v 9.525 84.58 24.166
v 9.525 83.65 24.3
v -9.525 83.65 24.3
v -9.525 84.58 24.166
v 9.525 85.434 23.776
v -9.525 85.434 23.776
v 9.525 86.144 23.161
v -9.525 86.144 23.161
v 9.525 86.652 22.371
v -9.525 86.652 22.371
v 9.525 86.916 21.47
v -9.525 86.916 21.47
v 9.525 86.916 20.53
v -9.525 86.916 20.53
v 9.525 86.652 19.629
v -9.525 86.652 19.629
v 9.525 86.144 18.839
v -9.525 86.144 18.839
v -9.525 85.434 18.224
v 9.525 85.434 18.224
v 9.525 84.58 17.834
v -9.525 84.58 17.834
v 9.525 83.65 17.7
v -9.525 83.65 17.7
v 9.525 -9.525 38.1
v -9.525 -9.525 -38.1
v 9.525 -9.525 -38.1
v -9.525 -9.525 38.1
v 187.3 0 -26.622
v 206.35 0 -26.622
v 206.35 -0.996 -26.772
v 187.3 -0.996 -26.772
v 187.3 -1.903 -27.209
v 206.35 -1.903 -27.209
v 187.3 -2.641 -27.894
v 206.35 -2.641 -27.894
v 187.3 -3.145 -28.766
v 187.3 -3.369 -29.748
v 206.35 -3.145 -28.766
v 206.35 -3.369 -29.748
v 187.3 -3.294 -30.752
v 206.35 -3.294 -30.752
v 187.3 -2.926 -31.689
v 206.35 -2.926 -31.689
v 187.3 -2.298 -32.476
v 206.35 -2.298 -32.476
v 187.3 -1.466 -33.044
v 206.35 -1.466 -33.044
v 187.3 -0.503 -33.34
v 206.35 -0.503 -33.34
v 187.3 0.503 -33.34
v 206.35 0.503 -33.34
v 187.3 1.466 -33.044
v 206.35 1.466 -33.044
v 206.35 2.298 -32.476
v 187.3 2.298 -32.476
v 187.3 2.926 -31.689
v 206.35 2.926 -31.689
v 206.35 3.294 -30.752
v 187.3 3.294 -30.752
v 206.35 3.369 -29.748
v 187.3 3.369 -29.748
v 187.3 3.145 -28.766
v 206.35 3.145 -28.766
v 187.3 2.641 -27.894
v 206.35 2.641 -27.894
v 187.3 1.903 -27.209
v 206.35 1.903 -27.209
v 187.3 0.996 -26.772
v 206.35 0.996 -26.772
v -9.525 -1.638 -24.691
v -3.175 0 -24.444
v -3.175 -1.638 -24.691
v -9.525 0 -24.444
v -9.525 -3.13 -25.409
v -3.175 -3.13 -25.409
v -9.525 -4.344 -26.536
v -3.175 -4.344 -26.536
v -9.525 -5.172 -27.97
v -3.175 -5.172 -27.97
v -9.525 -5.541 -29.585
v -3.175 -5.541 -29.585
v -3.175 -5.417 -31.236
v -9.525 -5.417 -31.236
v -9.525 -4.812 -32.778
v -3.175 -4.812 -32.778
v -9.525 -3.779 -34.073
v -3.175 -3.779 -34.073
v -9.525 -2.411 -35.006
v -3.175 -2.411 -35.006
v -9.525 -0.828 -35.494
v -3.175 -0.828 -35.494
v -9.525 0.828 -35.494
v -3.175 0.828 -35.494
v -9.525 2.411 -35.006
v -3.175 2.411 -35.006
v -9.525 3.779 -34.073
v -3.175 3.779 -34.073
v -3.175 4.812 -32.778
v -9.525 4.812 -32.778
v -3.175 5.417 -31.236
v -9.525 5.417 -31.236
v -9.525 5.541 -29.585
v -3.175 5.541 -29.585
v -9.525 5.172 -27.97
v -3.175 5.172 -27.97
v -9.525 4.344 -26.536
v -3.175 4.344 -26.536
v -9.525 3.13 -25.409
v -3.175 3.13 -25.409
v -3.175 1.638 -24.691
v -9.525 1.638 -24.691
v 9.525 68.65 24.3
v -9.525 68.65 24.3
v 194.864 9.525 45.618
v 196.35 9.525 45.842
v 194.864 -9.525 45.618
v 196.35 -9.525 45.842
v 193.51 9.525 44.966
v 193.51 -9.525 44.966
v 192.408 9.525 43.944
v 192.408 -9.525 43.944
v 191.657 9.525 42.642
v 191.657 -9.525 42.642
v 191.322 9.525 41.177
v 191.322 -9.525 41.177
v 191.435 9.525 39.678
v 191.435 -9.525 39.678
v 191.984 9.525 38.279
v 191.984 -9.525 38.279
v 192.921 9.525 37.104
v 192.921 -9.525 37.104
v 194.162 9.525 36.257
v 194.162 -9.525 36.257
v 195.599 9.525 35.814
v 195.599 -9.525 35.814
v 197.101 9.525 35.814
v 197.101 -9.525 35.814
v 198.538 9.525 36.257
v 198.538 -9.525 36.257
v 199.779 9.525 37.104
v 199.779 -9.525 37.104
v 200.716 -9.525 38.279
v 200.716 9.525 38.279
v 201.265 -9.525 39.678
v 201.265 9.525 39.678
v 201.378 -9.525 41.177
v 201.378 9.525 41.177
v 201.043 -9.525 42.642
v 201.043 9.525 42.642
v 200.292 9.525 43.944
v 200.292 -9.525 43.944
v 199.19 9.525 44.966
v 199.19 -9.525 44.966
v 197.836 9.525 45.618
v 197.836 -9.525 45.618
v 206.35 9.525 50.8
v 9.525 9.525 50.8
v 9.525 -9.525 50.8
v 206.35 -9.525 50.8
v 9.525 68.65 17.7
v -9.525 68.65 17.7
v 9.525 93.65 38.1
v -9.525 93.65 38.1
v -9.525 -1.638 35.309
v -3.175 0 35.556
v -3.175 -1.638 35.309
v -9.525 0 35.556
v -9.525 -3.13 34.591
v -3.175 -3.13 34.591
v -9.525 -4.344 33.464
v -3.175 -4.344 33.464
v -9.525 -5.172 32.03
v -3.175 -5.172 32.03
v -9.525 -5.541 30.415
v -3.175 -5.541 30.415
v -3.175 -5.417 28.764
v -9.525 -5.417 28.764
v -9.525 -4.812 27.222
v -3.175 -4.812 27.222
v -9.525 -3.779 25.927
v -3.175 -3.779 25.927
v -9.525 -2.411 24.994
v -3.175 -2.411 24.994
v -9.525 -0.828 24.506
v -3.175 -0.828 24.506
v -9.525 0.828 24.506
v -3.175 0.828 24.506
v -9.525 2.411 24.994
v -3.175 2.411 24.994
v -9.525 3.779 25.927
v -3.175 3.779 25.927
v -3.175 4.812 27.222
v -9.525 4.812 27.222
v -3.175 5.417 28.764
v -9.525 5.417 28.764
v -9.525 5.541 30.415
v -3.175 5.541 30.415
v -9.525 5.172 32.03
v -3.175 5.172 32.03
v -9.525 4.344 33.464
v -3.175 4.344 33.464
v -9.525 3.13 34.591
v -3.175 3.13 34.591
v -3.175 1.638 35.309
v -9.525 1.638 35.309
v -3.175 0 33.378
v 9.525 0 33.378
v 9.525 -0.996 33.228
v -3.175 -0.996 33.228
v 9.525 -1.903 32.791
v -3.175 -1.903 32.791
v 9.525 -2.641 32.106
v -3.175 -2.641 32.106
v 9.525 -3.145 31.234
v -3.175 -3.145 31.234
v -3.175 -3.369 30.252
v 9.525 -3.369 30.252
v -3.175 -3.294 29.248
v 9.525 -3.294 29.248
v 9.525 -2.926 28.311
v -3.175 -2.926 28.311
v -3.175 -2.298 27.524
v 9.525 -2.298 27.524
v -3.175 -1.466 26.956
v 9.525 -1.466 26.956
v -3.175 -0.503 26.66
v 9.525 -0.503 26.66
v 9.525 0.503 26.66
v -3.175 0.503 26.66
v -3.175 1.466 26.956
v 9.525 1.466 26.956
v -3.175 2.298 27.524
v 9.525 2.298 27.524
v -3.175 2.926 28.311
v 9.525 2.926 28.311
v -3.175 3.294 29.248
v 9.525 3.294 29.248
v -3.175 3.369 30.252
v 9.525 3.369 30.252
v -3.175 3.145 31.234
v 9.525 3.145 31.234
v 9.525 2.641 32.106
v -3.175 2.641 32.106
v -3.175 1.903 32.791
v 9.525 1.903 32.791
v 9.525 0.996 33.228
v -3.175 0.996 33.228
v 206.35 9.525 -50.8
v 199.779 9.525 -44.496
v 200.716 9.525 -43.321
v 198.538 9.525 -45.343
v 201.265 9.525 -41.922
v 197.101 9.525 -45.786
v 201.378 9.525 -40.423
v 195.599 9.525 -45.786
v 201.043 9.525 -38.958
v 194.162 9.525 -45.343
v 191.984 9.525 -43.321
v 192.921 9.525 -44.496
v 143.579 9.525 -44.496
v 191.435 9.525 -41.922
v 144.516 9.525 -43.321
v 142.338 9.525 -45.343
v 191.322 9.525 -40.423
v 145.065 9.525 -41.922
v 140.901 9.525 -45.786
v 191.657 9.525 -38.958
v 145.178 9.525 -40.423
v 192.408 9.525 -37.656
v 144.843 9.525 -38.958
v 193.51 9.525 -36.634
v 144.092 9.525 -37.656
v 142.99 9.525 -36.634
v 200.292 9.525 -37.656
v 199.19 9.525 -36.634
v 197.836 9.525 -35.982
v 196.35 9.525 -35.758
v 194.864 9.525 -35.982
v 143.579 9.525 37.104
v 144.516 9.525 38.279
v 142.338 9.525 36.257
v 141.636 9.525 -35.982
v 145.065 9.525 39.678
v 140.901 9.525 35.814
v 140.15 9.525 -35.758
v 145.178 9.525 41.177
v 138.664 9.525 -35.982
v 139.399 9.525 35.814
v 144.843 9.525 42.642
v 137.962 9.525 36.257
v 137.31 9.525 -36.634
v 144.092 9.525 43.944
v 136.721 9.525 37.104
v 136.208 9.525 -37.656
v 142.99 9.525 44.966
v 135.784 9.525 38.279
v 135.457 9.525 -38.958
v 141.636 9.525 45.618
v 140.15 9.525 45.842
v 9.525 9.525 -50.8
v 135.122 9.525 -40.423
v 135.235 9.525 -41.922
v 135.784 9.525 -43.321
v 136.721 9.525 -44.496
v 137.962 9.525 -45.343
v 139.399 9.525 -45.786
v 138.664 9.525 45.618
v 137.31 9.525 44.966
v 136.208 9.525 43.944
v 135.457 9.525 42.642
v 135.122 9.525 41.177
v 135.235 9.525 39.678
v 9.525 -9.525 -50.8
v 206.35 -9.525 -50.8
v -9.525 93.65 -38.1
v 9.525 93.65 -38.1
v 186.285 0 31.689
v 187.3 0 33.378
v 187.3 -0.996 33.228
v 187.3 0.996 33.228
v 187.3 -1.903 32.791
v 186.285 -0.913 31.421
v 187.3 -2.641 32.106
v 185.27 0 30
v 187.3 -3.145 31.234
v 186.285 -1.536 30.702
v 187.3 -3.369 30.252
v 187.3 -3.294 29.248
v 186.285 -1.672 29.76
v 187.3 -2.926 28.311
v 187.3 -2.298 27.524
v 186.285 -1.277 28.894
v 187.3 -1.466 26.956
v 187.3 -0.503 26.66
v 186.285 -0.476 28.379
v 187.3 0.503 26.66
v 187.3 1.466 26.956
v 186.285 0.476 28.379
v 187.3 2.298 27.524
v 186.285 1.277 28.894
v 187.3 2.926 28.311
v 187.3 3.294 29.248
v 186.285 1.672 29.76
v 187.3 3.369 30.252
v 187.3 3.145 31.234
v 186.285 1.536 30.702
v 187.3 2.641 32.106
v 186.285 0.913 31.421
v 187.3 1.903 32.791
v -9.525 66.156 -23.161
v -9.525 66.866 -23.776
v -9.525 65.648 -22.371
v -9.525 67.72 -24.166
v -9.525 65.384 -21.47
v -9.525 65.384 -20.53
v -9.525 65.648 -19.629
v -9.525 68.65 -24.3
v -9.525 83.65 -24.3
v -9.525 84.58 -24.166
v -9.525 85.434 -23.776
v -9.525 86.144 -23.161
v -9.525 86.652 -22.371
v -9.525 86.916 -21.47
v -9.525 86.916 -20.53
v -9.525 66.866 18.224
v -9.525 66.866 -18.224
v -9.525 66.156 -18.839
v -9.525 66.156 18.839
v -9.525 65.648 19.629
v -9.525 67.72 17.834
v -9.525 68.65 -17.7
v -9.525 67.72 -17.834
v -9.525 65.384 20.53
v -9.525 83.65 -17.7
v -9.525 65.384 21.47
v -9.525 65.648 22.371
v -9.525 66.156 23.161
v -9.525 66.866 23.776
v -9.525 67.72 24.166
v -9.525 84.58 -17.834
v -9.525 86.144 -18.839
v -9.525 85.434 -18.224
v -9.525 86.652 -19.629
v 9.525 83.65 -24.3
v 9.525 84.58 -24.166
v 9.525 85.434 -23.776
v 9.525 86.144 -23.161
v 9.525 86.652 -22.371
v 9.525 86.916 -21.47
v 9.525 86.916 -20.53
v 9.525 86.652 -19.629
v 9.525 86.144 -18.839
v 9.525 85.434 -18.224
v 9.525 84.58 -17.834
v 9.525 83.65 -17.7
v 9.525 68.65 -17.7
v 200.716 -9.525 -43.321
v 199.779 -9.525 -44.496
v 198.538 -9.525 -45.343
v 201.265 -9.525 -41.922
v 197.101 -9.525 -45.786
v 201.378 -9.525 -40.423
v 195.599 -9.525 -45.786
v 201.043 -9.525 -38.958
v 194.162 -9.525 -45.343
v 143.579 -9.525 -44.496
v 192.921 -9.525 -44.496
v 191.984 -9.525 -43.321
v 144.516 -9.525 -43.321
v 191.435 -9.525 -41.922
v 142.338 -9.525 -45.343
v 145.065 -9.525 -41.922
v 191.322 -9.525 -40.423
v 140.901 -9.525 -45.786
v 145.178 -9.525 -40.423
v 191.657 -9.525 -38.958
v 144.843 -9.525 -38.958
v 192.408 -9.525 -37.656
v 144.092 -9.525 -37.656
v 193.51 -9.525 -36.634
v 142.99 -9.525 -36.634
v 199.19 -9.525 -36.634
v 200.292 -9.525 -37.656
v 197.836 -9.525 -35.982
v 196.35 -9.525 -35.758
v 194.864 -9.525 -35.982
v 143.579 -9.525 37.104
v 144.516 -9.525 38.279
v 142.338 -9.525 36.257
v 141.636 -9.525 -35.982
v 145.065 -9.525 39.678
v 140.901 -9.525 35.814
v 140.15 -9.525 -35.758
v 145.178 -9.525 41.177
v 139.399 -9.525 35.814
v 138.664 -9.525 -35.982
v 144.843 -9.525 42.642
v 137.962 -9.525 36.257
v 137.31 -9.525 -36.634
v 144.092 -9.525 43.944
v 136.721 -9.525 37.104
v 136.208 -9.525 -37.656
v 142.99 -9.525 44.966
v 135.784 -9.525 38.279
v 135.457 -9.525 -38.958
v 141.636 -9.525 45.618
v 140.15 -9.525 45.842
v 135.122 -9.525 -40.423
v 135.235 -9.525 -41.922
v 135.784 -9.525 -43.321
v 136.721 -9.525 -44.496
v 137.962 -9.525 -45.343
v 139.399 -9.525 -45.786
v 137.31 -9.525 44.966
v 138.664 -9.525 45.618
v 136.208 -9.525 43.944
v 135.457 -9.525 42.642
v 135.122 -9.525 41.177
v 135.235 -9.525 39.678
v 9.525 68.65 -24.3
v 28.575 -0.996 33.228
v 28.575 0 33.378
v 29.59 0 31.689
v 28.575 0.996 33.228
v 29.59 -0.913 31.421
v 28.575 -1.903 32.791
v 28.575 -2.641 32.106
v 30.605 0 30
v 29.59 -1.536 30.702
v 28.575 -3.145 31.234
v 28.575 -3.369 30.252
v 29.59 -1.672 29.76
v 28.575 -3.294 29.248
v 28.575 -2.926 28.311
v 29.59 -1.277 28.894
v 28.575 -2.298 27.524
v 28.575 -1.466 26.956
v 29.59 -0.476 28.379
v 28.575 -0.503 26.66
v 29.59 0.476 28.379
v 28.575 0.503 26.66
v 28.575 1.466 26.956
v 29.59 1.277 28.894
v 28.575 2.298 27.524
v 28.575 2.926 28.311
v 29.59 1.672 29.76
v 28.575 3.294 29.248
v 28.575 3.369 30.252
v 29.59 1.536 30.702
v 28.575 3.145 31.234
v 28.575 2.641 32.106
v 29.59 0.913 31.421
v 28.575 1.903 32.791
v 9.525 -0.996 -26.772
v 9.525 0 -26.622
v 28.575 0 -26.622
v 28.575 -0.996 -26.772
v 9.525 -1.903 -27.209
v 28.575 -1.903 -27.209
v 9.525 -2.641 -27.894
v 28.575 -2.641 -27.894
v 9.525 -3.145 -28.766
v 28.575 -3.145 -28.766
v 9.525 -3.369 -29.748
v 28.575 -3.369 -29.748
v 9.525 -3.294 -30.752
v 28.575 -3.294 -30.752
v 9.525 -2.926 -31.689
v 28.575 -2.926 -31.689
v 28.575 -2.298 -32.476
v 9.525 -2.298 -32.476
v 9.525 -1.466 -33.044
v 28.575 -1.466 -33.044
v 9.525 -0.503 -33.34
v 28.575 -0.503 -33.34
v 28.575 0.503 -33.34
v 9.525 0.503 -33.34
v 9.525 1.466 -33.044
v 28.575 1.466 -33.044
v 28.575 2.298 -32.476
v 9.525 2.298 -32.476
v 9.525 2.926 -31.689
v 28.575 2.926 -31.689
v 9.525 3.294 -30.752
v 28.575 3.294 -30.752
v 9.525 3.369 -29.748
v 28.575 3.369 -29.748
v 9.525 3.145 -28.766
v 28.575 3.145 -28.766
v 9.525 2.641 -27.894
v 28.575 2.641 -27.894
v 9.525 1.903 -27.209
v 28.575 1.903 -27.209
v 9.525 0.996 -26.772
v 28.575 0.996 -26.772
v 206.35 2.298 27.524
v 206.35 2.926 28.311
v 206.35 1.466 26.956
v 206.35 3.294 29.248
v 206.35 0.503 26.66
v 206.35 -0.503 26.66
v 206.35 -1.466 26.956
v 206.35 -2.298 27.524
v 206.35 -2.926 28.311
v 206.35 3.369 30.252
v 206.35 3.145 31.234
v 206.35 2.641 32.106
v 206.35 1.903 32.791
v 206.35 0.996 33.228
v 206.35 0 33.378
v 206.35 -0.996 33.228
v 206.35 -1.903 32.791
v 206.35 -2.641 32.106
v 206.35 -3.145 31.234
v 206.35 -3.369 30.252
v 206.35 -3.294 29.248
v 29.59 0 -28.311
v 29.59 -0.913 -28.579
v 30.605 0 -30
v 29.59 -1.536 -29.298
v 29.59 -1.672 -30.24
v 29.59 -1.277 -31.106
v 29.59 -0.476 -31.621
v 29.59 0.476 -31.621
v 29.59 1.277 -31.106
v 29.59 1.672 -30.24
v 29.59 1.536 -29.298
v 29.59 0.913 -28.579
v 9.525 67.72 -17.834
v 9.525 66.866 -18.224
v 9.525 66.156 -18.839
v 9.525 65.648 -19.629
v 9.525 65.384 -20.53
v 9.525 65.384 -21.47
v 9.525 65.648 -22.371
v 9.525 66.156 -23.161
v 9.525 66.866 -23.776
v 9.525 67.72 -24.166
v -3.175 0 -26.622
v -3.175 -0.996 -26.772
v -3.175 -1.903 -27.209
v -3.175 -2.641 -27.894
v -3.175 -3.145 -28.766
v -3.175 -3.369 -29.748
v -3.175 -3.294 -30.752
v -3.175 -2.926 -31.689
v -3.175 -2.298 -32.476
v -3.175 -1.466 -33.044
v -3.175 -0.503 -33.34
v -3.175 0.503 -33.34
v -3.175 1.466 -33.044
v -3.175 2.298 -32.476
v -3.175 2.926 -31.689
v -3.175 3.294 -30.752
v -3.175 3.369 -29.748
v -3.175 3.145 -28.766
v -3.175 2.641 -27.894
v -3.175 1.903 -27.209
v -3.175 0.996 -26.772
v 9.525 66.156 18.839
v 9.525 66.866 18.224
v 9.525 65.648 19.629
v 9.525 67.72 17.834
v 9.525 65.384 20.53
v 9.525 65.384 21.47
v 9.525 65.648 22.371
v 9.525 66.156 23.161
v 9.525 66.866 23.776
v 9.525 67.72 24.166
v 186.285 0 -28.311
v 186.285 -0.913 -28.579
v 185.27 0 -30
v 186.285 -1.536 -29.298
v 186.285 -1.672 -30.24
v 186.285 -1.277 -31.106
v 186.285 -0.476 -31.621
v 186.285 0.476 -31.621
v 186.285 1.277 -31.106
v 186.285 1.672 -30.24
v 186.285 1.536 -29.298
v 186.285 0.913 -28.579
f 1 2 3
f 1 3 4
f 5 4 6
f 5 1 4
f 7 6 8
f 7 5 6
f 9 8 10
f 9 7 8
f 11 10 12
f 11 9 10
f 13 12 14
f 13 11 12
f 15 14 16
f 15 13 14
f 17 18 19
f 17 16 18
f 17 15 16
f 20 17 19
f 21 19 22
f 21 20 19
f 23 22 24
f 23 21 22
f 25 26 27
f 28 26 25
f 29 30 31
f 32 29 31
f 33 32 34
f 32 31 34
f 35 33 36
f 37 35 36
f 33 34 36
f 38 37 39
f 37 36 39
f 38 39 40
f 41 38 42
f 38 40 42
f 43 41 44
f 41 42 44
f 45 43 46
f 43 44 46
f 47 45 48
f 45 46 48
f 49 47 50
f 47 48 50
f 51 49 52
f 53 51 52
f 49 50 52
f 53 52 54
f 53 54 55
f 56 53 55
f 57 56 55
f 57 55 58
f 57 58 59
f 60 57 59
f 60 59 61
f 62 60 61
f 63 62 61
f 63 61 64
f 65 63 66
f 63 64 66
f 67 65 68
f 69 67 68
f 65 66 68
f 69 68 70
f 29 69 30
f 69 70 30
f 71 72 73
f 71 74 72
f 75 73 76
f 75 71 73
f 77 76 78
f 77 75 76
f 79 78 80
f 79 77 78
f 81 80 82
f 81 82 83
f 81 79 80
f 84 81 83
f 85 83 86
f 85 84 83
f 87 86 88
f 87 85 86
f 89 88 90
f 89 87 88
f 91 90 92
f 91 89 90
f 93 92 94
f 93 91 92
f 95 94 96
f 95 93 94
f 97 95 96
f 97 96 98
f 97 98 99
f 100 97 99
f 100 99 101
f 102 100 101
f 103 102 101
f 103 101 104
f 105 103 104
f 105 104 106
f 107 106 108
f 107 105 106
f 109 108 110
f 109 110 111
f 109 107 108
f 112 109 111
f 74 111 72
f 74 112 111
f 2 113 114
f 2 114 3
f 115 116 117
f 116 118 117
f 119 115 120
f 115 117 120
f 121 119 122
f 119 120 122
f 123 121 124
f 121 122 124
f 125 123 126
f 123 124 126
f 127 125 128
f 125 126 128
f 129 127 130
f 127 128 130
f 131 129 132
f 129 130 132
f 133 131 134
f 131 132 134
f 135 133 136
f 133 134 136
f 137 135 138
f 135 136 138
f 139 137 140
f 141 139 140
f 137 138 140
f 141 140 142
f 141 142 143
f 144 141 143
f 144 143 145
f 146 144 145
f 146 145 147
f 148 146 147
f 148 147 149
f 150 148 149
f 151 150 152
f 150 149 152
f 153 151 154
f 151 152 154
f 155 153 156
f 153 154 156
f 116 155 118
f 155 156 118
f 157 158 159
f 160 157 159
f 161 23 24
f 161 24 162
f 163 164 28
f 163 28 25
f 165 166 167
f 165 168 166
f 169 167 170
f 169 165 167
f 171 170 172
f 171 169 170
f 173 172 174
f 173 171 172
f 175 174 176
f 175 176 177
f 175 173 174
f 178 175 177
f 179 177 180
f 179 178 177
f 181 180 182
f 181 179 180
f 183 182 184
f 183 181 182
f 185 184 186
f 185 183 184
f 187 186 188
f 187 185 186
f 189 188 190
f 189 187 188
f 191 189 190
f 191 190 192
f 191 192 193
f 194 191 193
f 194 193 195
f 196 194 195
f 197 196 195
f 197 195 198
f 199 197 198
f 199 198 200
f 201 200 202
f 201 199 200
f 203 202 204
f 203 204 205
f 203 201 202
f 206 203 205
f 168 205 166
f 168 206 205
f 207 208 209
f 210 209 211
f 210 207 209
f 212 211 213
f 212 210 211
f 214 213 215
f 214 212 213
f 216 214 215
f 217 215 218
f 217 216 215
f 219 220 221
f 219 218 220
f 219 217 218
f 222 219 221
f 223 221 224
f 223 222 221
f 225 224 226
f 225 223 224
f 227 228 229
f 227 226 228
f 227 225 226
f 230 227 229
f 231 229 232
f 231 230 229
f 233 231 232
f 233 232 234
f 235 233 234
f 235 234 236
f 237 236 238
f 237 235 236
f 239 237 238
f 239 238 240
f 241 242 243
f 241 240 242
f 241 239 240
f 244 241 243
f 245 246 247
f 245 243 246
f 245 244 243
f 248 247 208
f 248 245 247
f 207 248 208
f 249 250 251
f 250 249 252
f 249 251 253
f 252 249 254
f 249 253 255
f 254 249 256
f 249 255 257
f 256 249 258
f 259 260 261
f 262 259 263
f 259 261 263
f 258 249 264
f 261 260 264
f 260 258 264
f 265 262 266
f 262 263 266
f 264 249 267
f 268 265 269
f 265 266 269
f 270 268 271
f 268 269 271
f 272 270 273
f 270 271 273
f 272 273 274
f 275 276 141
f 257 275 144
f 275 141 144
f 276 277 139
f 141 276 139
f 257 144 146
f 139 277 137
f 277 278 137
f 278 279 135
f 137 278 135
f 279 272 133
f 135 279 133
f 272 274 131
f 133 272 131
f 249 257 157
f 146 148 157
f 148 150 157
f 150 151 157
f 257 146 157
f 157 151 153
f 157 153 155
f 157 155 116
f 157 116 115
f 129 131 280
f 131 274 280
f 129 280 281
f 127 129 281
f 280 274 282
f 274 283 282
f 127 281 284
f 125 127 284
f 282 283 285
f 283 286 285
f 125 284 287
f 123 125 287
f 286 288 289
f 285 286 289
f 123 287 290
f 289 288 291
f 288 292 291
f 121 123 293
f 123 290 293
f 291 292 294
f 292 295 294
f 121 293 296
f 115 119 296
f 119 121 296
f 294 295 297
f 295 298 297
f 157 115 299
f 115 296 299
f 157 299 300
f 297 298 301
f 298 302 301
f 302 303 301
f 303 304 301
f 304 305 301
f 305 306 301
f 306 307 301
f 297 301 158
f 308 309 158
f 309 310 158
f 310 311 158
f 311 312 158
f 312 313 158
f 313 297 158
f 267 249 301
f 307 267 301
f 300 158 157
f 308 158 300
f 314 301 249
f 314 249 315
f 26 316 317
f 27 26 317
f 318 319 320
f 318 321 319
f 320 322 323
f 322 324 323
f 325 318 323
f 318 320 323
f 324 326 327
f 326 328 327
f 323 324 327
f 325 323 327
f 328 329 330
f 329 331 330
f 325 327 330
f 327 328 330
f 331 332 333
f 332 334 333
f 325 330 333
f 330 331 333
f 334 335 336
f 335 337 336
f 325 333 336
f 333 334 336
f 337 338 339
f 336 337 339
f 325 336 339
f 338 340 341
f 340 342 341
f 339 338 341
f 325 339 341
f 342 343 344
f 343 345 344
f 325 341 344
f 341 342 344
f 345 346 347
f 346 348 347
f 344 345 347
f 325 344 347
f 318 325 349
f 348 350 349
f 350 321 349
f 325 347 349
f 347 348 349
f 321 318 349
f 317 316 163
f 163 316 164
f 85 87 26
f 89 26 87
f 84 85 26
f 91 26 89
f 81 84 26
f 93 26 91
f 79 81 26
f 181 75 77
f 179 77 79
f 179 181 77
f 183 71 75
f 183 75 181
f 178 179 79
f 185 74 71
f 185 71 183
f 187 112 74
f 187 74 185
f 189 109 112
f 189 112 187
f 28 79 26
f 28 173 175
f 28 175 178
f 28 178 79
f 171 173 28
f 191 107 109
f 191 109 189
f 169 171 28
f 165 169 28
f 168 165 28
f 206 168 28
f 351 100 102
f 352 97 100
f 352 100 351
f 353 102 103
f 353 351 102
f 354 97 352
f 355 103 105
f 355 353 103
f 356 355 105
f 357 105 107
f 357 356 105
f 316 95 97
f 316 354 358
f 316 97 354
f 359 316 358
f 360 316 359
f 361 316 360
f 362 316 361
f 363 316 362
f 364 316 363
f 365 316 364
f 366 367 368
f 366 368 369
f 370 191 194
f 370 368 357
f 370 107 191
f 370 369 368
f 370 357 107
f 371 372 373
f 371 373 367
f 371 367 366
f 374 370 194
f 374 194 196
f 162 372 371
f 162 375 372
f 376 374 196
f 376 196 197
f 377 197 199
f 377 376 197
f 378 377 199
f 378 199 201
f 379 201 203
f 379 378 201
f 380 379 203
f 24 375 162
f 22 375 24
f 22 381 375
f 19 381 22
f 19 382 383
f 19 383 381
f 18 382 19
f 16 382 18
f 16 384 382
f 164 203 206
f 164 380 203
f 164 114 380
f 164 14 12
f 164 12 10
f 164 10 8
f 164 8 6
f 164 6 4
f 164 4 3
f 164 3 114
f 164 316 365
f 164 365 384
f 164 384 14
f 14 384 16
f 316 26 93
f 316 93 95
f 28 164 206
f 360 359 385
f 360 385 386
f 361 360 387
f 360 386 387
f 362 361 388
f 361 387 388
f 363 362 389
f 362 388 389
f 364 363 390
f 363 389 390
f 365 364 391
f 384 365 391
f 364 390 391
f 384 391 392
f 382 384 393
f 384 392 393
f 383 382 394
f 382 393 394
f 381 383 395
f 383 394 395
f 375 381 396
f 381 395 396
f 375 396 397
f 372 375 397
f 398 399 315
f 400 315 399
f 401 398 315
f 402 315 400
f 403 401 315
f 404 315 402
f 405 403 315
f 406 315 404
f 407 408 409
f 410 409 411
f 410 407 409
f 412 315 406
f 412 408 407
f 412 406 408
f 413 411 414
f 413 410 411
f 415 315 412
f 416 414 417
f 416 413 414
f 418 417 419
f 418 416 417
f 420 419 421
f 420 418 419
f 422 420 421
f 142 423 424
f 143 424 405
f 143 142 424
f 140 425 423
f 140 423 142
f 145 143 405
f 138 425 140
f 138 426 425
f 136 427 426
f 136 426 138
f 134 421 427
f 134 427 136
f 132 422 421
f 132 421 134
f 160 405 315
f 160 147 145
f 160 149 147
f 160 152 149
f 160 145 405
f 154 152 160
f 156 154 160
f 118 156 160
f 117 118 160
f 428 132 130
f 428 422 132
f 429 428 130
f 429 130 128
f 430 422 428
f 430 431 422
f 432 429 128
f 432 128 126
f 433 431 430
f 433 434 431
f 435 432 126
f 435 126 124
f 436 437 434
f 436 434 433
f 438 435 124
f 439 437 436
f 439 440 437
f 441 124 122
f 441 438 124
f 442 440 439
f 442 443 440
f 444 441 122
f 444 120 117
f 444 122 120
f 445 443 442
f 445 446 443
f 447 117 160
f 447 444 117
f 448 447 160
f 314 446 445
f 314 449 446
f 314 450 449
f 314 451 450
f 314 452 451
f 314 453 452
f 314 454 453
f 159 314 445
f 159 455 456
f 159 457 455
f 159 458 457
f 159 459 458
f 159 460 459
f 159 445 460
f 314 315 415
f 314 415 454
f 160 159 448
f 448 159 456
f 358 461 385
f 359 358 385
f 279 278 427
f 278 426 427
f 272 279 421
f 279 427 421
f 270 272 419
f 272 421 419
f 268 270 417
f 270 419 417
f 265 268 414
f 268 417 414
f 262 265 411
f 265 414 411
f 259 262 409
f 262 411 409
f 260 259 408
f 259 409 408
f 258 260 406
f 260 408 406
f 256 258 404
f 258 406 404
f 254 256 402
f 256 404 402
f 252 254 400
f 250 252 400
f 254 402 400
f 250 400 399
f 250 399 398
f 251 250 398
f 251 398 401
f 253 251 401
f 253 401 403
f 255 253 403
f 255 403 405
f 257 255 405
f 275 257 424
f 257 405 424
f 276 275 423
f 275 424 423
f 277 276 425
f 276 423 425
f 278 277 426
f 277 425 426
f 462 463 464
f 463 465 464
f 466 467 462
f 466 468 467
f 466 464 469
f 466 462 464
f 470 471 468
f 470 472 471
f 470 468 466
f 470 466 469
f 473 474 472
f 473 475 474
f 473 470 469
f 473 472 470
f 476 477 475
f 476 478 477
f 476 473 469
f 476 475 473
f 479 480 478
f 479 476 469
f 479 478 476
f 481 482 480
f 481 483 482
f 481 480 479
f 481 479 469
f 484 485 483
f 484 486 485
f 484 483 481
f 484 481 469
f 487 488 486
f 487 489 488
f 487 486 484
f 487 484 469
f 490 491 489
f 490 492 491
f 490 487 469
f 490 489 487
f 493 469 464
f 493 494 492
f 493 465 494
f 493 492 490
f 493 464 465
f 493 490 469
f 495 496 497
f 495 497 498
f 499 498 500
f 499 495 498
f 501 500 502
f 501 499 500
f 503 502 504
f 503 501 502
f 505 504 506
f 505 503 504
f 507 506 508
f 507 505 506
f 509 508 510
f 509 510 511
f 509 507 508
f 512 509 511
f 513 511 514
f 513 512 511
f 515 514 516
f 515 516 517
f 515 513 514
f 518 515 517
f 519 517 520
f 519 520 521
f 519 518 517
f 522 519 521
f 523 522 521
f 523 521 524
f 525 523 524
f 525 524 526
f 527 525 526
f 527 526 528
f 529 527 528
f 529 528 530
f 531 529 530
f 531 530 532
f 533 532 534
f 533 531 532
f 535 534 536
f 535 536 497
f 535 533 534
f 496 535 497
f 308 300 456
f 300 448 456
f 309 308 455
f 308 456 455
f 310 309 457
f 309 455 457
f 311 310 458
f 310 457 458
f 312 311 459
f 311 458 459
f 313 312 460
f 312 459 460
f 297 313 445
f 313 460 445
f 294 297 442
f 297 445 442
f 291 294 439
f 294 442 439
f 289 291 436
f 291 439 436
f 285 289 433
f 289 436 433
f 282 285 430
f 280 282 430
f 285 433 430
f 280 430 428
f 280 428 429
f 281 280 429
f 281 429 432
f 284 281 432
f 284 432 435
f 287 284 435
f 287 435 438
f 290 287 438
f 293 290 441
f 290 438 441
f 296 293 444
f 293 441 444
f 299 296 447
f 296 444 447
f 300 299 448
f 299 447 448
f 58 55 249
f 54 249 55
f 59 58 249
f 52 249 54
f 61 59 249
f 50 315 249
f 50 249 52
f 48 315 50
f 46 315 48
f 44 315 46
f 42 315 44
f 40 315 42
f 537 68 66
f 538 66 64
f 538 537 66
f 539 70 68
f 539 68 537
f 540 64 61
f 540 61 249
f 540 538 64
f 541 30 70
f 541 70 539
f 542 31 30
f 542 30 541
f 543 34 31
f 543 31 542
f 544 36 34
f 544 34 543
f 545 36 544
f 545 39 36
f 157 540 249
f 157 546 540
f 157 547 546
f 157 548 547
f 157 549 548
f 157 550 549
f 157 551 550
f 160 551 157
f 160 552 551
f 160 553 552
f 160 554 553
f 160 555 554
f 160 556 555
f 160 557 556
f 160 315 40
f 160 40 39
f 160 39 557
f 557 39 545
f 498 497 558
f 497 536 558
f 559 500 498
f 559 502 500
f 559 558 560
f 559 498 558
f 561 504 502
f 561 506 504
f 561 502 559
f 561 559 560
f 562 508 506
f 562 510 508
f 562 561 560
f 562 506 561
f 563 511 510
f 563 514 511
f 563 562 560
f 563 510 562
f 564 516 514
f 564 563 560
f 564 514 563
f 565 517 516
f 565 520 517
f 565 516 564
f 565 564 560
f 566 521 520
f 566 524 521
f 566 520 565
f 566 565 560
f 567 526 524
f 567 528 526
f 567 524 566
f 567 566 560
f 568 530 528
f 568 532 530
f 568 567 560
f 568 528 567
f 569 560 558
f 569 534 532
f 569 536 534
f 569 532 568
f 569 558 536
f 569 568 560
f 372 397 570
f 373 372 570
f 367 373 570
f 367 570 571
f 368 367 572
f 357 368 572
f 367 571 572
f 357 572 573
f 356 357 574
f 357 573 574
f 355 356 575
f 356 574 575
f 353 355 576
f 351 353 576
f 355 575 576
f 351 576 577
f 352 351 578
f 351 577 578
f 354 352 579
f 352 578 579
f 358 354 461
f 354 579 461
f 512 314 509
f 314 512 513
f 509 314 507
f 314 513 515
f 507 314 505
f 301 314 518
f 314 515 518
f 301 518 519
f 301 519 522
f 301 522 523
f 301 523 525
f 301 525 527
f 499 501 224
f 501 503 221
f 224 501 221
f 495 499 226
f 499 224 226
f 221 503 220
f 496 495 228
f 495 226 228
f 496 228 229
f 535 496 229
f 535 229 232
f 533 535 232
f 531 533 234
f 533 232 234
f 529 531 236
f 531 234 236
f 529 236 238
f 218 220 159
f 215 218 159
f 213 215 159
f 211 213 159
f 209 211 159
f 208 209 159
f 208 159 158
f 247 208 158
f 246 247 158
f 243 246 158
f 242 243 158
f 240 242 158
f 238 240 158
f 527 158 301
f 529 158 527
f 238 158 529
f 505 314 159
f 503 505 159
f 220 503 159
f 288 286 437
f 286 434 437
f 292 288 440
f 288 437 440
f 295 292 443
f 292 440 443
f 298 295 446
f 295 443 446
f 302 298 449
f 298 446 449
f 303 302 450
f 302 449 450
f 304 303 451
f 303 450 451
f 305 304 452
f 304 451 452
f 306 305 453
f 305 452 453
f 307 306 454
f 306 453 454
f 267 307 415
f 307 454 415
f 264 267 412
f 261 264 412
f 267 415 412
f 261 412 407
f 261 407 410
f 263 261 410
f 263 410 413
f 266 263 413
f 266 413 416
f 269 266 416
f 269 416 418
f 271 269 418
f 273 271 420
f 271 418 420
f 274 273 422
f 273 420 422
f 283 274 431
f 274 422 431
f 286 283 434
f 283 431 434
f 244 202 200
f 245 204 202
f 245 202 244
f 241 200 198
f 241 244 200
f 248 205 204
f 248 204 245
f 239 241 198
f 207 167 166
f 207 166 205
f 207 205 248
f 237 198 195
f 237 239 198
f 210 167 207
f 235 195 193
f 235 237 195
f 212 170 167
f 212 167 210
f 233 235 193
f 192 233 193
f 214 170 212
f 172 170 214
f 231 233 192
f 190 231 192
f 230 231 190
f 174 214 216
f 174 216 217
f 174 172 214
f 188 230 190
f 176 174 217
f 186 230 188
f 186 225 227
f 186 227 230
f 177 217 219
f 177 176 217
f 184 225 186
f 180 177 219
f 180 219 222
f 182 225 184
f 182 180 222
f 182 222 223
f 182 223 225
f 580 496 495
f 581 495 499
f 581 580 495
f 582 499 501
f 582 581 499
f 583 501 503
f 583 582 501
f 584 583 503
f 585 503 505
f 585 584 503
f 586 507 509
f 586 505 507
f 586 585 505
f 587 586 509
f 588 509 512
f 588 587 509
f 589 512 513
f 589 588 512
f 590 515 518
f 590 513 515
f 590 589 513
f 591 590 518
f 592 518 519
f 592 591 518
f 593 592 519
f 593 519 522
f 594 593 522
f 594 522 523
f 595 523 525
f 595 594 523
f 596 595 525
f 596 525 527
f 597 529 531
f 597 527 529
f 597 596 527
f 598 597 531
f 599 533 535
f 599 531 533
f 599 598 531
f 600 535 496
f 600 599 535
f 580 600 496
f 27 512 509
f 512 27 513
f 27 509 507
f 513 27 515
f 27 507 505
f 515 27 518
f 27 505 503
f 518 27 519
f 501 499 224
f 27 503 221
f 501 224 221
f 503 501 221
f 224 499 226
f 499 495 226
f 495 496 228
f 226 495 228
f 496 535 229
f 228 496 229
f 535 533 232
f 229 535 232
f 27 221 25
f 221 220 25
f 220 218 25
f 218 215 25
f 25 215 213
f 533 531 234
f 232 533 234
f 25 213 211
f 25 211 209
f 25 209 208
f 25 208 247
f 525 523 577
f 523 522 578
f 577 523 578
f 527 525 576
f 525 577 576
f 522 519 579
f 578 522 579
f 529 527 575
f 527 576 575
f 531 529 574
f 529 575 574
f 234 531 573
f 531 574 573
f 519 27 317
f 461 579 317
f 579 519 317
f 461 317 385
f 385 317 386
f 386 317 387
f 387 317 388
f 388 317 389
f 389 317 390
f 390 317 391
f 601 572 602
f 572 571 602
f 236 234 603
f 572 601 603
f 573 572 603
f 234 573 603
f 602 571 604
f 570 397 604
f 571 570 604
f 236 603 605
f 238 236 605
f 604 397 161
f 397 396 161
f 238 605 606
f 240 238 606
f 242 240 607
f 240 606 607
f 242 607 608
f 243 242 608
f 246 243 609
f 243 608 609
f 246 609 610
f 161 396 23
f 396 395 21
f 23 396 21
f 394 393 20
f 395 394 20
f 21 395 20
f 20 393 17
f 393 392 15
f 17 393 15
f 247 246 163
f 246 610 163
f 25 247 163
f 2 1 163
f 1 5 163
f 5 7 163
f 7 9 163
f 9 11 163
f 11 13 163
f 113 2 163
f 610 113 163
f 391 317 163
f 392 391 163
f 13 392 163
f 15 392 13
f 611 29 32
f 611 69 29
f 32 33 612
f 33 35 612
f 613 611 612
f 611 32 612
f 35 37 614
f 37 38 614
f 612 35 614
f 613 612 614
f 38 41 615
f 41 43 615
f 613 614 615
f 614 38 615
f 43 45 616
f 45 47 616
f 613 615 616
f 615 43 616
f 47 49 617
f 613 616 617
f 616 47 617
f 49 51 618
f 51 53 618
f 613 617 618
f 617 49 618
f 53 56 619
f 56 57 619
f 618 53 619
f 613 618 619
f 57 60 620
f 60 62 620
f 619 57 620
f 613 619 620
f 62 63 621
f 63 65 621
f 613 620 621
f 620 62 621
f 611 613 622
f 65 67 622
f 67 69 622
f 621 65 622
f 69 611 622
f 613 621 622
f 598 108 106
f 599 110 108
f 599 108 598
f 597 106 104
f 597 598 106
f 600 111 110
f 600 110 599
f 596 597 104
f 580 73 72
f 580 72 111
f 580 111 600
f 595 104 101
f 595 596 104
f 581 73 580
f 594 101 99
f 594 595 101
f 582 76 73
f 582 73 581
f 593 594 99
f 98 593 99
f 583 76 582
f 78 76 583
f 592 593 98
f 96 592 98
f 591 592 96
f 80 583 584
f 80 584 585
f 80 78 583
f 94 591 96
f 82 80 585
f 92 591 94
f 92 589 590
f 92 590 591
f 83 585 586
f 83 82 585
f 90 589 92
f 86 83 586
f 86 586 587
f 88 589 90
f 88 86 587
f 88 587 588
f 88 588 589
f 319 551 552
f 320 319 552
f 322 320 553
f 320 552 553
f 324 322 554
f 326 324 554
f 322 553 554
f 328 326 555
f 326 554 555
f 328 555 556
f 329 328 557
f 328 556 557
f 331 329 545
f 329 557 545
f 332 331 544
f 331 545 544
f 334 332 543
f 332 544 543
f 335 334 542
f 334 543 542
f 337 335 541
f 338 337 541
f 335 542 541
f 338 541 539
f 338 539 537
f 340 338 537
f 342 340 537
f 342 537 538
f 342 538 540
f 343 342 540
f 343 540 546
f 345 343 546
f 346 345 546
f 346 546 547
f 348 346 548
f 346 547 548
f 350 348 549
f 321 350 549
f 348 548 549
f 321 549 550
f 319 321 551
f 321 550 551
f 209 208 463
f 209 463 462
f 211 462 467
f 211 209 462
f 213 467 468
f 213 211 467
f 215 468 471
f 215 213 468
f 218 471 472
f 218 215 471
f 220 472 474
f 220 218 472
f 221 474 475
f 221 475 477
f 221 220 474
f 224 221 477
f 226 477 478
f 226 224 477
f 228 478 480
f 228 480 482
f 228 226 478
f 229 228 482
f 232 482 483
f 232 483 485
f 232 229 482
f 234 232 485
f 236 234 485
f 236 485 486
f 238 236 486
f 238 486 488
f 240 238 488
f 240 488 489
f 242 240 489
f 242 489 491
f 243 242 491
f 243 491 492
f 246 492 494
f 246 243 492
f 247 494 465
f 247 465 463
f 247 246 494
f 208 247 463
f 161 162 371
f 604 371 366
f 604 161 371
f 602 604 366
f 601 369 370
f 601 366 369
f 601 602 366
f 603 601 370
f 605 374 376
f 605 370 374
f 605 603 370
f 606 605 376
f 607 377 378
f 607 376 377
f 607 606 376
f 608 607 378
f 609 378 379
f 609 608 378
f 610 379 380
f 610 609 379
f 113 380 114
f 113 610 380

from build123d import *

# Parameters (mm, degrees)
CROQUIS18_ON_SEGMENT_1_W                      = 101.6
CROQUIS18_ON_SEGMENT_1_H                      = 19.05
SOLID_3_X_0_75_1_DEPTH                        = 103.175
SOLID_3_X_0_75_1_2_DEPTH                      = 206.35
SOLID_3_X_0_75_1_2_DEPTH_BACK                 = 1
CROQUIS18_W                                   = 101.6
CROQUIS18_H                                   = 19.05
CORTAR_EXTRUIR1_DEPTH                         = 224.810283778
CROQUIS14_W                                   = 5.0419
CROQUIS14_H                                   = 19.05
TALADRO_DE_MARGEN_PARA_3_81_AT_2_COUNT        = 2
TALADRO_DE_MARGEN_PARA_3_81_AT_2_PITCH        = 56.2
TALADRO_DE_MARGEN_PARA_3_81_AT_3_COUNT        = 2
TALADRO_DE_MARGEN_PARA_3_81_AT_3_PITCH        = 81.6
TALADRO_DE_MARGEN_PARA_3_81_AT_4_COUNT        = 2
TALADRO_DE_MARGEN_PARA_3_81_AT_4_PITCH        = 99.080775128
SKETCH3_W                                     = 19.05
SKETCH3_H                                     = 12.7
CUT_EXTRUDE2_DEPTH                            = 237.233027168
CBORE_FOR_1_4_SOCKET_HEAD_CAP_SCREW1_AT_COUNT = 2
CBORE_FOR_1_4_SOCKET_HEAD_CAP_SCREW1_AT_PITCH = 60


with BuildPart() as part:
    # Croquis18 on segment 1 (carried to segment 1) → Solid 3 X 0.75(1) (new body)
    with BuildSketch(Plane(origin=(0, 93.65, 0), x_dir=(0, 0, 1), z_dir=(0, -1, 0))):
        Rectangle(CROQUIS18_ON_SEGMENT_1_W, CROQUIS18_ON_SEGMENT_1_H)
    extrude(amount=SOLID_3_X_0_75_1_DEPTH)

    # Croquis12 → Cortar-Extruir1 (cut, through all)
    with BuildSketch(Plane(origin=(9.525, 0, 0), x_dir=(0, 0, -1), z_dir=(1, 0, 0))):
        with BuildLine():
            Line((-17.7, 83.65), (-17.7, 68.65))
            ThreePointArc((-17.7, 68.65), (-21, 65.35), (-24.3, 68.65))
            Line((-24.3, 68.65), (-24.3, 83.65))
            ThreePointArc((-24.3, 83.65), (-21, 86.95), (-17.7, 83.65))
        make_face()
        with BuildLine():
            Line((17.7, 83.65), (17.7, 68.65))
            ThreePointArc((17.7, 68.65), (21, 65.35), (24.3, 68.65))
            Line((24.3, 68.65), (24.3, 83.65))
            ThreePointArc((24.3, 83.65), (21, 86.95), (17.7, 83.65))
        make_face()
    extrude(amount=-CORTAR_EXTRUIR1_DEPTH, mode=Mode.SUBTRACT)

    # Sketch3 → Cut-Extrude2 (cut, through all)
    with BuildSketch(Plane(origin=(0, 93.65, 0), x_dir=(1, 0, 0), z_dir=(0, 1, 0))):
        with Locations((0, -44.45)):
            Rectangle(SKETCH3_W, SKETCH3_H)
        with Locations((0, 44.45)):
            Rectangle(SKETCH3_W, SKETCH3_H)
    extrude(amount=-CUT_EXTRUDE2_DEPTH, mode=Mode.SUBTRACT)


with BuildPart() as body_2:
    # Croquis18 → Solid 3 X 0.75_1 2 (new, two sides: drawn at the far end of the back side and taken through both)
    with BuildSketch(Plane(origin=(0, 0, 0), x_dir=(0, 0, 1), z_dir=(1, 0, 0)).offset(-SOLID_3_X_0_75_1_2_DEPTH_BACK)):
        Rectangle(CROQUIS18_W, CROQUIS18_H)
    extrude(amount=SOLID_3_X_0_75_1_2_DEPTH + SOLID_3_X_0_75_1_2_DEPTH_BACK)

    # Solid 3 X 0.75_1 2 end butt 1
    split(bisect_by=Plane.YZ.offset(9.525), keep=Keep.TOP)

    # Croquis14 → Taladro de margen para 3/81 (revolve, cut)
    with BuildSketch(Plane(origin=(196.35, 9.525, 40.8), x_dir=(0, 0, 1), z_dir=(1, 0, 0))):
        with Locations((2.52095, 9.525)):
            Rectangle(CROQUIS14_W, CROQUIS14_H)
    taladro_de_margen_para_3_81 = revolve(axis=Axis((196.35, 15.875, 40.8), (0, -1, 0)), mode=Mode.SUBTRACT)

    # Taladro de margen para 3/81 at 2: Taladro de margen para 3/81 ×2
    with Locations(*[(-i * TALADRO_DE_MARGEN_PARA_3_81_AT_2_PITCH, 0, 0) for i in range(1, TALADRO_DE_MARGEN_PARA_3_81_AT_2_COUNT)]):
        add(taladro_de_margen_para_3_81, mode=Mode.SUBTRACT)

    # Taladro de margen para 3/81 at 3: Taladro de margen para 3/81 ×2
    with Locations(*[(0, 0, -i * TALADRO_DE_MARGEN_PARA_3_81_AT_3_PITCH) for i in range(1, TALADRO_DE_MARGEN_PARA_3_81_AT_3_COUNT)]):
        add(taladro_de_margen_para_3_81, mode=Mode.SUBTRACT)

    # Taladro de margen para 3/81 at 4: Taladro de margen para 3/81 ×2
    with Locations(*[Vector(-0.567213971906228, 2.8685392694633734e-15, -0.823570464547121) * (i * TALADRO_DE_MARGEN_PARA_3_81_AT_4_PITCH) for i in range(1, TALADRO_DE_MARGEN_PARA_3_81_AT_4_COUNT)]):
        add(taladro_de_margen_para_3_81, mode=Mode.SUBTRACT)


with BuildPart() as cbore_for_1_4_socket_head_cap_screw1_tool:
    # Sketch6 → CBORE for 1/4 Socket Head Cap Screw1 (revolve)
    with BuildSketch(Plane(origin=(-9.525, 0, 30), x_dir=(0, 0, 1), z_dir=(0, 1, 0))):
        Polygon((0, 0), (0, 40.129827343), (3.3782, 38.1), (3.3782, 6.35), (5.55625, 6.35), (5.55625, 0), align=None)
    cbore_for_1_4_socket_head_cap_screw1 = revolve(axis=Axis((-15.875, 0, 30), (1, 0, 0)))


with BuildPart() as part_1:
    add(part.part)

    # CBORE for 1/4 Socket Head Cap Screw1: cut by cbore_for_1_4_socket_head_cap_screw1_tool
    add(cbore_for_1_4_socket_head_cap_screw1_tool.part, mode=Mode.SUBTRACT)


with BuildPart() as body_2_1:
    add(body_2.part)

    # CBORE for 1/4 Socket Head Cap Screw1: cut by cbore_for_1_4_socket_head_cap_screw1_tool
    add(cbore_for_1_4_socket_head_cap_screw1_tool.part, mode=Mode.SUBTRACT)


with BuildPart() as cbore_for_1_4_socket_head_cap_screw1_at_tool:
    # CBORE for 1/4 Socket Head Cap Screw1 at: CBORE for 1/4 Socket Head Cap Screw1 ×2
    with Locations(*[(0, 0, -i * CBORE_FOR_1_4_SOCKET_HEAD_CAP_SCREW1_AT_PITCH) for i in range(1, CBORE_FOR_1_4_SOCKET_HEAD_CAP_SCREW1_AT_COUNT)]):
        add(cbore_for_1_4_socket_head_cap_screw1)


with BuildPart() as part_2:
    add(part_1.part)

    # CBORE for 1/4 Socket Head Cap Screw1 at: cut by cbore_for_1_4_socket_head_cap_screw1_at_tool
    add(cbore_for_1_4_socket_head_cap_screw1_at_tool.part, mode=Mode.SUBTRACT)


with BuildPart() as body_2_2:
    add(body_2_1.part)

    # CBORE for 1/4 Socket Head Cap Screw1 at: cut by cbore_for_1_4_socket_head_cap_screw1_at_tool
    add(cbore_for_1_4_socket_head_cap_screw1_at_tool.part, mode=Mode.SUBTRACT)

    # Mirror1: CBORE for 1/4 Socket Head Cap Screw1 across plane
    add(cbore_for_1_4_socket_head_cap_screw1.mirror(Plane.ZY.offset(-107.9375)), mode=Mode.SUBTRACT)

    # Mirror1 copy 1 sketch → Mirror1 copy 1 (revolve, cut)
    with BuildSketch(Plane(origin=(225.4, 0, -30), x_dir=(0, 0, 1), z_dir=(0, 1, 0))):
        Polygon((0, 0), (0, -40.129827343), (3.3782, -38.1), (3.3782, -6.35), (5.55625, -6.35), (5.55625, 0), align=None)
    revolve(axis=Axis((231.75, 0, -30), (1, 0, 0)), mode=Mode.SUBTRACT)


solid = Compound([part_2.part, body_2_2.part])
